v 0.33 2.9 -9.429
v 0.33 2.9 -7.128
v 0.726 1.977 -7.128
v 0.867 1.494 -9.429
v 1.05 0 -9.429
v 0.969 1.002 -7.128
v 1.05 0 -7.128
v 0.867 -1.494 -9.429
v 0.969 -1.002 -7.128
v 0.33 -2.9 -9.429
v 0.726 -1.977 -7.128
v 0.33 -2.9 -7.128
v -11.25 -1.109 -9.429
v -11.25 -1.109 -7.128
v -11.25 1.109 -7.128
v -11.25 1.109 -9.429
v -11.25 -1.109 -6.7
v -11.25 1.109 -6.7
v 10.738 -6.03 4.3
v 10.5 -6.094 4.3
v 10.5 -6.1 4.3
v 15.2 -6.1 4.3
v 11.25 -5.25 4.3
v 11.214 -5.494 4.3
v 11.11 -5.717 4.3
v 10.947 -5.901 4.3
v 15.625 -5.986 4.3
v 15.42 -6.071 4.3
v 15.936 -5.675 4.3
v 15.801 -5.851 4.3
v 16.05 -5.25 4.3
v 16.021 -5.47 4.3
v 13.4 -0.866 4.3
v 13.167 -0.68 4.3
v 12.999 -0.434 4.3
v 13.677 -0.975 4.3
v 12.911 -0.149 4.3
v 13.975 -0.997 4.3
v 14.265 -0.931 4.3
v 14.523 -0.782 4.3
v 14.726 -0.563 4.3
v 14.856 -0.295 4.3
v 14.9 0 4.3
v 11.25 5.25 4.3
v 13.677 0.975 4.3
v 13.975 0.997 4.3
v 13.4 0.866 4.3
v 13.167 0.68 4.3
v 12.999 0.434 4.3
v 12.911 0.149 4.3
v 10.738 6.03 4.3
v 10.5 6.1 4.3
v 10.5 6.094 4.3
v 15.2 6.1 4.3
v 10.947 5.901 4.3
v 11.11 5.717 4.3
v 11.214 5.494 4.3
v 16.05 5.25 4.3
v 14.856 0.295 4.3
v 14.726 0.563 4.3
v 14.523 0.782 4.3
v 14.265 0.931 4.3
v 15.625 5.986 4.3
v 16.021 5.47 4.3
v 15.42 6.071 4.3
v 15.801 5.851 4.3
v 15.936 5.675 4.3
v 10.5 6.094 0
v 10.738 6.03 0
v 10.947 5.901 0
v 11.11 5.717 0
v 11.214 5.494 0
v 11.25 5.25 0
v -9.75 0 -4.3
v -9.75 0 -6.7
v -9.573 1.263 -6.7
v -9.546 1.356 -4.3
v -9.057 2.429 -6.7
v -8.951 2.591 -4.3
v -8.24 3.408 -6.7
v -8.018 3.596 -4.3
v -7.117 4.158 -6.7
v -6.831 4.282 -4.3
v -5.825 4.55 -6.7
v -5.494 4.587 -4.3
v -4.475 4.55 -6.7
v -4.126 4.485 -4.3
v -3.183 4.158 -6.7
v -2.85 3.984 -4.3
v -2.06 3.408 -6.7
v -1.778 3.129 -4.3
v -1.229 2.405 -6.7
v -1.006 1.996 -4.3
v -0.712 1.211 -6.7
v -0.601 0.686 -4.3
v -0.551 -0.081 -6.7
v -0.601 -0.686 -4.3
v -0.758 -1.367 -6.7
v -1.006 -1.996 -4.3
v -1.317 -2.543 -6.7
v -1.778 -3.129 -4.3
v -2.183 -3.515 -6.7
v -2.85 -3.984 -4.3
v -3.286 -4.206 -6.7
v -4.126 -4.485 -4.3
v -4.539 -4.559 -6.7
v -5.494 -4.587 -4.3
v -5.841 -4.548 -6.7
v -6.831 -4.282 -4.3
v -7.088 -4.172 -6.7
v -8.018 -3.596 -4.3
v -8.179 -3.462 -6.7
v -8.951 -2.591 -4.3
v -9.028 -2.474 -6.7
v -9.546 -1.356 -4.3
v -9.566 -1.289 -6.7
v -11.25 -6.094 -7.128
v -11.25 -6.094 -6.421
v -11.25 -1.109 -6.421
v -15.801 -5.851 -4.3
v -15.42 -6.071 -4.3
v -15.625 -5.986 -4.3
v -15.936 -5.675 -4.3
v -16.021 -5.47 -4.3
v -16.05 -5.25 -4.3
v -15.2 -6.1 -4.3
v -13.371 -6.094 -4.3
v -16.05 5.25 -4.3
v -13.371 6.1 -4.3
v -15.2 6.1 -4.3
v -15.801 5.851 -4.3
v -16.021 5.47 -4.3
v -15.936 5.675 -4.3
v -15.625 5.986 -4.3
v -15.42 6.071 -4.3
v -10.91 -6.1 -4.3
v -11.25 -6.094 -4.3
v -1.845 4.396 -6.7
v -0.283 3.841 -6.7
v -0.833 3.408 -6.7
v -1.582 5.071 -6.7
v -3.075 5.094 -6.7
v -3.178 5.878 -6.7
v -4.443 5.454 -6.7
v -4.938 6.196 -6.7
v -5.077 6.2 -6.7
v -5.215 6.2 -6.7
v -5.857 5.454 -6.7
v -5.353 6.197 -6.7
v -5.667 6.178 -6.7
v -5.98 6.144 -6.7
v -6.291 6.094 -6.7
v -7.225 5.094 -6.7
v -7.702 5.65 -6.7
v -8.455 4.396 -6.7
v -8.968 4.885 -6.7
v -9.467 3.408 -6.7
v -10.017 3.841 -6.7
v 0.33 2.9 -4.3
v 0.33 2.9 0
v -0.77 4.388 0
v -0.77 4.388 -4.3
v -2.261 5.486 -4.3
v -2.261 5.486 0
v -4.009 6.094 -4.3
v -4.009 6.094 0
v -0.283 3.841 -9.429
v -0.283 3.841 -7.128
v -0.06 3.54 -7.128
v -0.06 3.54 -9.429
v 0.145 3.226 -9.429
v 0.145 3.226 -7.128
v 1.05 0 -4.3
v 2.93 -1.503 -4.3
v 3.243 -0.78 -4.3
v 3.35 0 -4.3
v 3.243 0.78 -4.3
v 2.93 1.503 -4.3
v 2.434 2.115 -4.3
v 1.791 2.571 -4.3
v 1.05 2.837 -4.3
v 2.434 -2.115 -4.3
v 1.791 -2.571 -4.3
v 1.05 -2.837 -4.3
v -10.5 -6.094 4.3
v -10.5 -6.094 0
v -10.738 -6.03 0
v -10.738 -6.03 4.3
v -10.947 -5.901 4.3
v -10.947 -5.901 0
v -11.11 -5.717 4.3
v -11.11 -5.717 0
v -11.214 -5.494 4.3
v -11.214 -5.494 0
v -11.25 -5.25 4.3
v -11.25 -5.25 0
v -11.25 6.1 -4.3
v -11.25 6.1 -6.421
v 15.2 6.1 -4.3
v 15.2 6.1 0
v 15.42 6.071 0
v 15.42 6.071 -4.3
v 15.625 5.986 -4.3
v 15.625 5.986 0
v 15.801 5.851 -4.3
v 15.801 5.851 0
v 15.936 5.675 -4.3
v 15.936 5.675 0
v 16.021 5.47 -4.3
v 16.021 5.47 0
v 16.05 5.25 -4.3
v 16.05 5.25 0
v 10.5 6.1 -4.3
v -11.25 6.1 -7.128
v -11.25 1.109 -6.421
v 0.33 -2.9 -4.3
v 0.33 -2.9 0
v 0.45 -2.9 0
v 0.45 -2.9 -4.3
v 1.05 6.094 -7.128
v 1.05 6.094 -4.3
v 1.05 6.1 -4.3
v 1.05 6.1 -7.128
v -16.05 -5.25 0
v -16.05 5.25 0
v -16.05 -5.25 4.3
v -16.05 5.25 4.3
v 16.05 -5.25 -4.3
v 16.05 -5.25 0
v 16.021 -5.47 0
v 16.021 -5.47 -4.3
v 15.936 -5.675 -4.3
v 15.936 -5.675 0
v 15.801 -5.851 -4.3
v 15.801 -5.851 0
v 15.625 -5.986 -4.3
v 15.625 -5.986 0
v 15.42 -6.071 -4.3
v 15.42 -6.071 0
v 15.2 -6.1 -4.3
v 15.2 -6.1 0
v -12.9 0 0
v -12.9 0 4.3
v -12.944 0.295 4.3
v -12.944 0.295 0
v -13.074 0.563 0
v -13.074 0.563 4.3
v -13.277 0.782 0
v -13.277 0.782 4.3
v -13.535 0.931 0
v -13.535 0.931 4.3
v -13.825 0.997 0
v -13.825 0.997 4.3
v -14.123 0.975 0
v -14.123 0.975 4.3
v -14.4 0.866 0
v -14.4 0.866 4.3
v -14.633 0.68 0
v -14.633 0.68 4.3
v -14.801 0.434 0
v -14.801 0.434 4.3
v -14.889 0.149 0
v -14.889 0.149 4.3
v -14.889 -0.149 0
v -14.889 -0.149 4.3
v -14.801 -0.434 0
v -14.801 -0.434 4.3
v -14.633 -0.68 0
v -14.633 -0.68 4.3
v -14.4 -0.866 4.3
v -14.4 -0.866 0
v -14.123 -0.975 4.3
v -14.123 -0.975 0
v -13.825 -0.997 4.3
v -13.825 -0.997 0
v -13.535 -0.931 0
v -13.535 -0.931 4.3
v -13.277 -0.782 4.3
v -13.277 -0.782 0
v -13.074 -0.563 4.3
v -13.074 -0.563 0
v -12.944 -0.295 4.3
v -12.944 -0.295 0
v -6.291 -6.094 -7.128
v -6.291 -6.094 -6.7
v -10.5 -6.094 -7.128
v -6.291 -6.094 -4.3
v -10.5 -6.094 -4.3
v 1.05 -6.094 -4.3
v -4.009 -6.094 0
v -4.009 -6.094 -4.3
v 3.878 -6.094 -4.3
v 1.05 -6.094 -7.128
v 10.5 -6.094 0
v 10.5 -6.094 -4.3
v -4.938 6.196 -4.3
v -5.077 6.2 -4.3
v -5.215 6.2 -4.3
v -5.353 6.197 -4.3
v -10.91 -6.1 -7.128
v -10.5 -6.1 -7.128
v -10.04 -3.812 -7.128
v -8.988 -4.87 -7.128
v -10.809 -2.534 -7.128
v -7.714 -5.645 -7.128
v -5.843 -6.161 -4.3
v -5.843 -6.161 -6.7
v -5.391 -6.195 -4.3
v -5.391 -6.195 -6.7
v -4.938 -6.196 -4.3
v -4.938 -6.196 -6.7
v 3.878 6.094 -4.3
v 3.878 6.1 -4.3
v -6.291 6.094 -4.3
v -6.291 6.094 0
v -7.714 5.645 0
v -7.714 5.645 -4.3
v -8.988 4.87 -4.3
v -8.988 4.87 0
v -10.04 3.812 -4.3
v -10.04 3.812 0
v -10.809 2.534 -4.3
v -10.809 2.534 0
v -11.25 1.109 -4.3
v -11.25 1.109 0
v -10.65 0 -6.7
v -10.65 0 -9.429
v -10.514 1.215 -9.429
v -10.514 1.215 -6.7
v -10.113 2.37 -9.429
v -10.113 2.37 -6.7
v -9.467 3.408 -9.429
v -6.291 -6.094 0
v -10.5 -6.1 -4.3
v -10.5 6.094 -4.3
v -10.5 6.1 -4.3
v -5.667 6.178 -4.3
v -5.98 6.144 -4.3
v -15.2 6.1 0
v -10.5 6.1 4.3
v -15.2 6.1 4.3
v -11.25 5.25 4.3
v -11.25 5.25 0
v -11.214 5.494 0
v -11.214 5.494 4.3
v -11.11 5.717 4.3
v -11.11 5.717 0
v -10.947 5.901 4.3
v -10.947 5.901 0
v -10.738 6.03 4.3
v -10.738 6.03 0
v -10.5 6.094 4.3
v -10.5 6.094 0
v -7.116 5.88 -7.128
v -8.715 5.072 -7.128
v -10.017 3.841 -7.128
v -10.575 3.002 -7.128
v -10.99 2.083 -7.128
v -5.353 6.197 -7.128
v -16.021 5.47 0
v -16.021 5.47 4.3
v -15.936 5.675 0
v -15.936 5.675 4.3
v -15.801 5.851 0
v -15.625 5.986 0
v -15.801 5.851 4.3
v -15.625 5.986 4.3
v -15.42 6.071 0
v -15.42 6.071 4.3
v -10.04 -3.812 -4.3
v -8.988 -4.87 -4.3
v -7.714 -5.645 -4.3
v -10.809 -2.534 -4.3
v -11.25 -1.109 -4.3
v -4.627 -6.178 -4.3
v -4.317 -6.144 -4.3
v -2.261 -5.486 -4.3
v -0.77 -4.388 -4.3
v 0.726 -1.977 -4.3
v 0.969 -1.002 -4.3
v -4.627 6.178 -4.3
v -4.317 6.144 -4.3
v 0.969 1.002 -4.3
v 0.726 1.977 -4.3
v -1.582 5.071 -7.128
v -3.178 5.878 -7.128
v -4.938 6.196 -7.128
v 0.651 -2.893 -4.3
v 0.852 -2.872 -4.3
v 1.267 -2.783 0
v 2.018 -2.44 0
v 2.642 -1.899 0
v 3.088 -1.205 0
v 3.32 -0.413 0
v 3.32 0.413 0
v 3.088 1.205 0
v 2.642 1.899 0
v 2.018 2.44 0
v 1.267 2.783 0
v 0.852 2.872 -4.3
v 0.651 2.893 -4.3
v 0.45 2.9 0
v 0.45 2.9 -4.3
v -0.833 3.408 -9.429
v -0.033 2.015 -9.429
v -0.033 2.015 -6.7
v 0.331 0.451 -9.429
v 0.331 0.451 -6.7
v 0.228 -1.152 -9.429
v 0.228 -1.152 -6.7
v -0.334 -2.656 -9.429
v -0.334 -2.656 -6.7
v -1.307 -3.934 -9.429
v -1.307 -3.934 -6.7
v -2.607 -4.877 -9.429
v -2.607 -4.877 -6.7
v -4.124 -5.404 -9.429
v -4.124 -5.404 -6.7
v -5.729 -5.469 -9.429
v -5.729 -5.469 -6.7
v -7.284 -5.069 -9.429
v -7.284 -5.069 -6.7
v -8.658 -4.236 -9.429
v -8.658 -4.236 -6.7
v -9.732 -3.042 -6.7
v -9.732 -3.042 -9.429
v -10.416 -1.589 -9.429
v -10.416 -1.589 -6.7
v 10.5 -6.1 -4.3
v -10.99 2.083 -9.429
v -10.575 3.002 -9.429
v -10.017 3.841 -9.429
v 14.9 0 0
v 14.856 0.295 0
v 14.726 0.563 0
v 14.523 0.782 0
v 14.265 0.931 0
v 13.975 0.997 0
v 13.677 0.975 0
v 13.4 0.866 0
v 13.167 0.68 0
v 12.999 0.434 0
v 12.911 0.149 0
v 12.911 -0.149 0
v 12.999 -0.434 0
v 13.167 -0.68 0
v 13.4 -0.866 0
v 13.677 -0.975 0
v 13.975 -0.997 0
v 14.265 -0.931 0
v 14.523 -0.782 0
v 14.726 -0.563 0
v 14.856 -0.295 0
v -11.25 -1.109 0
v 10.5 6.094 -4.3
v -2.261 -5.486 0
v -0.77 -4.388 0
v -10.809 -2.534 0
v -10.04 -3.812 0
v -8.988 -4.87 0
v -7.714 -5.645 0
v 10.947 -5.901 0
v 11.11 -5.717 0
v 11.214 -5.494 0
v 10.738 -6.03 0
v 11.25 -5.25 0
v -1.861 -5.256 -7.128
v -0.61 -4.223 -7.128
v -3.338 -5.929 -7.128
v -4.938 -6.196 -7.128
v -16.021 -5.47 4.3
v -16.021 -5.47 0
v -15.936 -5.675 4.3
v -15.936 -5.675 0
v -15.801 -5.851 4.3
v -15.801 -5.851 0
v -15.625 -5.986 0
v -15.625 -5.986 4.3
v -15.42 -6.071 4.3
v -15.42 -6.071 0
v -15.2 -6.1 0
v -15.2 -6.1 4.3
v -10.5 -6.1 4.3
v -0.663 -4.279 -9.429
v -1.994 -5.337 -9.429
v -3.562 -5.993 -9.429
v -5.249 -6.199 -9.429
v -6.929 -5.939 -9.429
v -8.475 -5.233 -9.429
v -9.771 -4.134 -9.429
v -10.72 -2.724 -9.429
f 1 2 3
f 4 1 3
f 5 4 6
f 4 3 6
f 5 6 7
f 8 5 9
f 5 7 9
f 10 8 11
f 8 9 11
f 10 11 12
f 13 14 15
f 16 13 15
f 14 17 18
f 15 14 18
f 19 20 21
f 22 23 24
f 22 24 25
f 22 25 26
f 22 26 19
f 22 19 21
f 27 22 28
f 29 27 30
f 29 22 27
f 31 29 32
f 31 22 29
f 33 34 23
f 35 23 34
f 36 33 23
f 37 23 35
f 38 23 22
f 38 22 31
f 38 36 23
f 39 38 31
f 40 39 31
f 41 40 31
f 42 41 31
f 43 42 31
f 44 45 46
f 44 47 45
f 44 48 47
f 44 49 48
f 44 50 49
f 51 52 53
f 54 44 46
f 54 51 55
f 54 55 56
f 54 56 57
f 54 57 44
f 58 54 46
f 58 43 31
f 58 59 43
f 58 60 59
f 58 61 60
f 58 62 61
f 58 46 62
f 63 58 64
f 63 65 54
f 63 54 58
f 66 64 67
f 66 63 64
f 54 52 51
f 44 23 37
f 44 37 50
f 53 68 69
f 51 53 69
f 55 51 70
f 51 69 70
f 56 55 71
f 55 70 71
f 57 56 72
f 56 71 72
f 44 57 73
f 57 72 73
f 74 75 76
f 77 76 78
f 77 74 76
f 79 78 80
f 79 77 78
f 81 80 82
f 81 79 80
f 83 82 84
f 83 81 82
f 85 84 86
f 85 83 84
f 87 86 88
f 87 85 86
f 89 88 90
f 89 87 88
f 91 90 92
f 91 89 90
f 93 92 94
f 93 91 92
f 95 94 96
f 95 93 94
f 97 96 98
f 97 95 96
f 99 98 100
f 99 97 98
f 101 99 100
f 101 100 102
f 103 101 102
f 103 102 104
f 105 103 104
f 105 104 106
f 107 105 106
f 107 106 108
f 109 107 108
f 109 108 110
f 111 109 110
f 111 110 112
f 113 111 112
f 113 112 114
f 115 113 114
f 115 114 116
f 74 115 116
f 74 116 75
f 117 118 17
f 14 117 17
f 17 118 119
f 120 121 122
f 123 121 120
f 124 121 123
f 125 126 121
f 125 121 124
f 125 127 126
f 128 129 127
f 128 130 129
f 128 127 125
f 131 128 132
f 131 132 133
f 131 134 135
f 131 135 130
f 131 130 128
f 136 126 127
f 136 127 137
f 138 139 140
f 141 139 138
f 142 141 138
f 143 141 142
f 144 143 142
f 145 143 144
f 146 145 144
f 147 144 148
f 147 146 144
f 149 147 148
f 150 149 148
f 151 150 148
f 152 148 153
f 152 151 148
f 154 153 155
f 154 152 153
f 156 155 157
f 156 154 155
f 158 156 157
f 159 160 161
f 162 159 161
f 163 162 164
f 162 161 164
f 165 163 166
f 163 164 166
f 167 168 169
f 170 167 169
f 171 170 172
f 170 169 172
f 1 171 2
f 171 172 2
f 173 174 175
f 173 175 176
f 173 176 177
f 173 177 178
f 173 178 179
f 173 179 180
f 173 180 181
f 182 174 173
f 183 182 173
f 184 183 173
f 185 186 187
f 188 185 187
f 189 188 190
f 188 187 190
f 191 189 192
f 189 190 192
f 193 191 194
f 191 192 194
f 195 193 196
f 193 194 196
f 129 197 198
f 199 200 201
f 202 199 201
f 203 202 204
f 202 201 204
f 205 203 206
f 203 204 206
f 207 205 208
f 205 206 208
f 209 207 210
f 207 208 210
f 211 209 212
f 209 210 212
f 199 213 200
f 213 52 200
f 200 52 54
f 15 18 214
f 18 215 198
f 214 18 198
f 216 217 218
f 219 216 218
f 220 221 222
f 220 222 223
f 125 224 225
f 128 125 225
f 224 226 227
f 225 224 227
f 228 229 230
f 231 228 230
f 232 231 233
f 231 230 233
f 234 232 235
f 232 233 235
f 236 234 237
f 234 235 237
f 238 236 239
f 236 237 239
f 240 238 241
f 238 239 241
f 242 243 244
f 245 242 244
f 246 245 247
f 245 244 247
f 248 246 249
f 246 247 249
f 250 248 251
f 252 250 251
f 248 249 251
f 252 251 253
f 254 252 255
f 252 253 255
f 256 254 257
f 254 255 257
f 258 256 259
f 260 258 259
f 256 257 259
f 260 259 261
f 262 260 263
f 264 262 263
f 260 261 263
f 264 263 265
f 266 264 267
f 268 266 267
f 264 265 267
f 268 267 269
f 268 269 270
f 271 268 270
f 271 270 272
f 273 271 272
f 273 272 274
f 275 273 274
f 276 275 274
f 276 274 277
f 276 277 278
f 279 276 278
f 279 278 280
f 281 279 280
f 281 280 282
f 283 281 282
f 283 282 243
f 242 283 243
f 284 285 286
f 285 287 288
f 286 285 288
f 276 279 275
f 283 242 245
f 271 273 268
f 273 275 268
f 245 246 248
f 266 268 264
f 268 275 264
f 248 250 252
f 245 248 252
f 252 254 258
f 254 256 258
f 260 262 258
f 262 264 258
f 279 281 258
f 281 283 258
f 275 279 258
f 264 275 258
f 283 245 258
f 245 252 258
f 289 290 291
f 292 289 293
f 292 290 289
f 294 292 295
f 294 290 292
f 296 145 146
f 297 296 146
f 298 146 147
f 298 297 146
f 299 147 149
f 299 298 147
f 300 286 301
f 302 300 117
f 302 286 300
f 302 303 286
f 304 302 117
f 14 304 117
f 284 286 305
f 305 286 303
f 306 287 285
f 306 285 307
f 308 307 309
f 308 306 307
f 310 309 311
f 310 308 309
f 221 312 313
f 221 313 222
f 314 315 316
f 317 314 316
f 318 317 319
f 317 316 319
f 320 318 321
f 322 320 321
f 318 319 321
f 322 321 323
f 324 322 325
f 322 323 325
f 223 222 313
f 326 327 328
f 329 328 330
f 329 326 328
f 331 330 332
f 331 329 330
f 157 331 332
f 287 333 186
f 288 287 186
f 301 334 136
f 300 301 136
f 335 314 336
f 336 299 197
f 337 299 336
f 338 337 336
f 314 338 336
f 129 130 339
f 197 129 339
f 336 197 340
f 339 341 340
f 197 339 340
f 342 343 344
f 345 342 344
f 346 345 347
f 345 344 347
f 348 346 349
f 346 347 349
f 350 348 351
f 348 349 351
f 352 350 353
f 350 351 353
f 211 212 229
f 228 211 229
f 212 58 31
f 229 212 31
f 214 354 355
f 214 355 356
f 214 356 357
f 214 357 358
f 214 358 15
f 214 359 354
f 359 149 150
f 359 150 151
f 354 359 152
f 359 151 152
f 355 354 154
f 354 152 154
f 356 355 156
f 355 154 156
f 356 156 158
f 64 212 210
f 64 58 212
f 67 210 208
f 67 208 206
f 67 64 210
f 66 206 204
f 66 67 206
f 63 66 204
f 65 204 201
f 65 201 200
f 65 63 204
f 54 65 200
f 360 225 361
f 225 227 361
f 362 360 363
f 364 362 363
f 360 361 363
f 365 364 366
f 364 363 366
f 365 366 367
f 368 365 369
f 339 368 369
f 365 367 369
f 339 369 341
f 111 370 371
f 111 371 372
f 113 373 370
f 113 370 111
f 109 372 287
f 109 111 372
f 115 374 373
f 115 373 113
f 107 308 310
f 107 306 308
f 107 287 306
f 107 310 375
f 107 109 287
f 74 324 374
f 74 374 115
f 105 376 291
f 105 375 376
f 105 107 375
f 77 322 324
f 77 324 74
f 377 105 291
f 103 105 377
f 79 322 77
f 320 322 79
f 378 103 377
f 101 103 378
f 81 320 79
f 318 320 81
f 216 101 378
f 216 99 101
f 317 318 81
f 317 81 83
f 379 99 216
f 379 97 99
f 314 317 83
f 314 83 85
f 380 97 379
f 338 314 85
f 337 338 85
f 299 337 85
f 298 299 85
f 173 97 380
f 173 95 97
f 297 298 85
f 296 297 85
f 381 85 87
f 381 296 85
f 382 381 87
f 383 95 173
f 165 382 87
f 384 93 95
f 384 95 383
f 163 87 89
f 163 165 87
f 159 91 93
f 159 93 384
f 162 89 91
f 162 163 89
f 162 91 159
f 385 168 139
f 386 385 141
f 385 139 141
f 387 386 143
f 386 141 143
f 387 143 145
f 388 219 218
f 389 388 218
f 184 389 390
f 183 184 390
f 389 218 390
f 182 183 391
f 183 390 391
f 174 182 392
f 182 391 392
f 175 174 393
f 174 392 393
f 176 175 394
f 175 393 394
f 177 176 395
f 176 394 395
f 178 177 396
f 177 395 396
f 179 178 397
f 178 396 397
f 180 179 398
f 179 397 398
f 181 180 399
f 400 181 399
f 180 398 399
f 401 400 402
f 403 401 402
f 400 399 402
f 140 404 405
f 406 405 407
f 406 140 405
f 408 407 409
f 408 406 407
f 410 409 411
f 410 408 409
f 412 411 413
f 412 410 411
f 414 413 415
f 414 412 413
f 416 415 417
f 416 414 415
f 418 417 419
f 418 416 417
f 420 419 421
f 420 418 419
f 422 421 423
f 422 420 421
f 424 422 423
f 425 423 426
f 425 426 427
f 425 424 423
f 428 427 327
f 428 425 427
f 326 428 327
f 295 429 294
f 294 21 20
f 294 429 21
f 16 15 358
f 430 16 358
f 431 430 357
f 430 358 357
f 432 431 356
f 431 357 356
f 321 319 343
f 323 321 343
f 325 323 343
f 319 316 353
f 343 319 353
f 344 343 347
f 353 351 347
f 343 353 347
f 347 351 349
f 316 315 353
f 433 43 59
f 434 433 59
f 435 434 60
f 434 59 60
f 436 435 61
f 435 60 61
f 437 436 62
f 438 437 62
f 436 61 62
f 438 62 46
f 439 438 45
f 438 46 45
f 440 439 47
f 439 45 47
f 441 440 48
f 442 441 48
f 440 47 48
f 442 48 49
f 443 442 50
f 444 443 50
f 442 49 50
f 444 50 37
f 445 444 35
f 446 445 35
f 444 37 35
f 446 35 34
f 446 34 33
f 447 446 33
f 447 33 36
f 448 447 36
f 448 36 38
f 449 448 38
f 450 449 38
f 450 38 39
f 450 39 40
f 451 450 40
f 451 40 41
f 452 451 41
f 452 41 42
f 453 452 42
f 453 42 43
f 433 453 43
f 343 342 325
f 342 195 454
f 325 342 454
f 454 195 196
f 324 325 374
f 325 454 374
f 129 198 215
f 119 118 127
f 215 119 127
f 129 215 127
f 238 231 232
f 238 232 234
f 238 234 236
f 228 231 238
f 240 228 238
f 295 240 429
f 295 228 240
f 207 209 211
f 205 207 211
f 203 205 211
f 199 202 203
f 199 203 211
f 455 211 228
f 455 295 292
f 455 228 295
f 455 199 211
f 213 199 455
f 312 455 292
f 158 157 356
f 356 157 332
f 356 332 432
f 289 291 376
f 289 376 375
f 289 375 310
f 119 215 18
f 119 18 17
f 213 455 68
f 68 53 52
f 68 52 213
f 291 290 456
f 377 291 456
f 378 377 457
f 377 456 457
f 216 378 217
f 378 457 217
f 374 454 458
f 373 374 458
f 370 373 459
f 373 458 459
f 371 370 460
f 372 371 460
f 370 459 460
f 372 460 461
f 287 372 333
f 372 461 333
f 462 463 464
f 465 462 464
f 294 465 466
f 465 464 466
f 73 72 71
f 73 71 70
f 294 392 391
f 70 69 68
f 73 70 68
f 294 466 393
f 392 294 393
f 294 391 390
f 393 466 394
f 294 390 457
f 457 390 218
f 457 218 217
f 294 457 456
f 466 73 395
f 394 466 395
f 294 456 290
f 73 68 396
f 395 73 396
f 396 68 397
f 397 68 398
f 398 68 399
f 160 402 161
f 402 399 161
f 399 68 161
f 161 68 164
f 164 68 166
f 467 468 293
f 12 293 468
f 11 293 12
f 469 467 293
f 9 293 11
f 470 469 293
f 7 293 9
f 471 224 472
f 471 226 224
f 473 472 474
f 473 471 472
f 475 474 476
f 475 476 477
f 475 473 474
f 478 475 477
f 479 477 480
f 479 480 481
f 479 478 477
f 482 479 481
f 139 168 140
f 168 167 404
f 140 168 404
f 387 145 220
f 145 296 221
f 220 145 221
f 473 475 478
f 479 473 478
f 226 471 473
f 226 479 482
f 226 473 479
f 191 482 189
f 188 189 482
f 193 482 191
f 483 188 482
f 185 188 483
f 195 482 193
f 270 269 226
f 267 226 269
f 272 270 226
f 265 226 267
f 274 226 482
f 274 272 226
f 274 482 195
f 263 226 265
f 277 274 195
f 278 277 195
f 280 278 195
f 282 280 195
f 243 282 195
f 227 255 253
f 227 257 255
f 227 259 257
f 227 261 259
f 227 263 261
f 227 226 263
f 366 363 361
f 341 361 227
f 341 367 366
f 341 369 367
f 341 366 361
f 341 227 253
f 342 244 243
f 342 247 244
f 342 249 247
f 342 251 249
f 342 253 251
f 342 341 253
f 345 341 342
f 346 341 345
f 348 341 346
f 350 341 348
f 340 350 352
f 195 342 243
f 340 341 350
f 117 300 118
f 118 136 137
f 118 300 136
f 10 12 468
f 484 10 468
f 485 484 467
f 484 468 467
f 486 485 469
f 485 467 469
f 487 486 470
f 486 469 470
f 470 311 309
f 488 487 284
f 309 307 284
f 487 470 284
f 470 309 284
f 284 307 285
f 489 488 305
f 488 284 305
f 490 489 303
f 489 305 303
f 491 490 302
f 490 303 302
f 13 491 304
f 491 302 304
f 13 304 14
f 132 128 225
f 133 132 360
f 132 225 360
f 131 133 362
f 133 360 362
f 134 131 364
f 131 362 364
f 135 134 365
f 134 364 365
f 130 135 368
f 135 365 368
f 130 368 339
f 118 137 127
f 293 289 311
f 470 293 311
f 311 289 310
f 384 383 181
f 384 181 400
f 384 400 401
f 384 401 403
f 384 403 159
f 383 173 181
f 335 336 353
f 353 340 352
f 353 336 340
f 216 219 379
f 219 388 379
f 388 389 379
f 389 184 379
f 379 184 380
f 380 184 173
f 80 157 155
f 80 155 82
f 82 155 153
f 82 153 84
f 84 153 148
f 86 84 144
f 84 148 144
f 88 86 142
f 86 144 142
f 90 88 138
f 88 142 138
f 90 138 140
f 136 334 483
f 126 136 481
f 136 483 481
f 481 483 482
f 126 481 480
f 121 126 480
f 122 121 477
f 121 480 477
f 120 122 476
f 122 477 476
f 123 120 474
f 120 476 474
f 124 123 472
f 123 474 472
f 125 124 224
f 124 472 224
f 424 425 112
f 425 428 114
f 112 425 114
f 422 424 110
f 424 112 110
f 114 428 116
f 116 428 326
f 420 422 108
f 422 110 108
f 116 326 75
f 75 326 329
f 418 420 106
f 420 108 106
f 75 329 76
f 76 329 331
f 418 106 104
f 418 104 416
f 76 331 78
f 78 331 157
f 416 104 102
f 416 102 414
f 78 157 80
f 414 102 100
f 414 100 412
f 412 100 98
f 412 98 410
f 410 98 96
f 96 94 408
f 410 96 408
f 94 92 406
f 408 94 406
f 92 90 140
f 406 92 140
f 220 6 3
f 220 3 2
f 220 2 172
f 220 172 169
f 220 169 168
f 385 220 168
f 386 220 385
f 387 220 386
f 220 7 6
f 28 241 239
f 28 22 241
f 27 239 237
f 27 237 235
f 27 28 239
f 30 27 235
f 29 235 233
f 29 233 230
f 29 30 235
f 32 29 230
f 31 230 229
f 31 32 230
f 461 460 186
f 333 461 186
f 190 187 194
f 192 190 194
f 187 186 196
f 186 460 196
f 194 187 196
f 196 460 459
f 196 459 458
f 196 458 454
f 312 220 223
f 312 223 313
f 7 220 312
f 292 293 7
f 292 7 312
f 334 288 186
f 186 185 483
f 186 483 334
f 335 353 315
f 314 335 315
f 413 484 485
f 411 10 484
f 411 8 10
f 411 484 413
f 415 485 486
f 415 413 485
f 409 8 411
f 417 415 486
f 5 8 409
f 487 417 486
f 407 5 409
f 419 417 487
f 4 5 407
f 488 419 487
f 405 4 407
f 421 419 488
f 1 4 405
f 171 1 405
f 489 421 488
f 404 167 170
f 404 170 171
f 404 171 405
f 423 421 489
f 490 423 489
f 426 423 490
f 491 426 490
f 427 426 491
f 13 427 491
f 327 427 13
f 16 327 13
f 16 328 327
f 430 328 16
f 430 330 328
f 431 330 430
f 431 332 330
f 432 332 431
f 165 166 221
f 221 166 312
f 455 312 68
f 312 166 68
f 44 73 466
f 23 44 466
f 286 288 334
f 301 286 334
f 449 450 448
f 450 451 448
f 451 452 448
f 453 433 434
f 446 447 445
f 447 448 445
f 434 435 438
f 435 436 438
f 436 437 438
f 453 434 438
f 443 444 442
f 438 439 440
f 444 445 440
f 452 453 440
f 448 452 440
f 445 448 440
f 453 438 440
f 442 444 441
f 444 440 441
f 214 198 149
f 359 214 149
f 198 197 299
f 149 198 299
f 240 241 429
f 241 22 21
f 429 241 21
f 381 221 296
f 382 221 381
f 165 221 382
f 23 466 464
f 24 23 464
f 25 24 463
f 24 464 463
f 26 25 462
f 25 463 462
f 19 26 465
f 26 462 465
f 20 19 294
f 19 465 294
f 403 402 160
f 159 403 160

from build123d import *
from build123d.topology import SkipClean

# Parameters (mm, degrees)
SKETCH1_W           = 32.1
SKETCH1_H           = 12.2
BOSS_EXTRUDE1_DEPTH = 4.3
FILLET1_R           = 0.85
CUT_EXTRUDE1_DEPTH  = 10
SKETCH3_R           = 1
CUT_EXTRUDE2_DEPTH  = 5
BOSS_EXTRUDE2_DEPTH = 4.3
SKETCH6_R           = 4.6
BOSS_EXTRUDE3_DEPTH = 2.4
CUT_EXTRUDE4_DEPTH  = 2.4
SKETCH7_R           = 5.5
BOSS_EXTRUDE4_DEPTH = 2.729404
CUT_EXTRUDE3_DEPTH  = 2.729404426
BOSS_EXTRUDE5_DEPTH = 12.194097
BOSS_EXTRUDE6_DEPTH = 2.82843


with BuildPart() as part:
    # Sketch1 → Boss-Extrude1 (new body)
    with BuildSketch(Plane.XY):
        Rectangle(SKETCH1_W, SKETCH1_H)
    extrude(amount=BOSS_EXTRUDE1_DEPTH)

    # Fillet1
    fillet1_edges = [part.edges().sort_by_distance(p)[0] for p in [
        (16.05, -6.1, 2.15),
        (-16.05, -6.1, 2.15),
        (-16.05, 6.1, 2.15),
        (16.05, 6.1, 2.15),
    ]]
    fillet(fillet1_edges, radius=FILLET1_R)

    # Sketch2 → Cut-Extrude1 (cut)
    with BuildSketch(Plane(origin=(0, 0, 0), x_dir=(-1, 0, 0), z_dir=(0, 0, -1))):
        with BuildLine():
            ThreePointArc((-10.4, 6), (-10.930330086, 5.780330086), (-11.15, 5.25))
            Line((-11.15, 5.25), (-11.15, -5.25))
            ThreePointArc((-11.15, -5.25), (-10.930330086, -5.780330086), (-10.4, -6))
            Line((-10.4, -6), (-10.4, -6.1))
            Line((-10.4, -6.1), (10.4, -6.1))
            Line((10.4, -6.1), (10.4, -6))
            ThreePointArc((10.4, -6), (10.930330086, -5.780330086), (11.15, -5.25))
            Line((11.15, -5.25), (11.15, 5.25))
            ThreePointArc((11.15, 5.25), (10.930330086, 5.780330086), (10.4, 6))
            Line((10.4, 6), (10.4, 6.1))
            Line((10.4, 6.1), (-10.4, 6.1))
            Line((-10.4, 6.1), (-10.4, 6))
        make_face()
        with BuildLine():
            Line((-11.15, -5.25), (-11.15, 5.25))
            ThreePointArc((-11.15, 5.25), (-10.930330086, 5.780330086), (-10.4, 6))
            Line((-10.4, 6), (-10.4, 6.1))
            Line((-10.4, 6.1), (-10.5, 6.1))
            Line((-10.5, 6.1), (-10.5, 6.094097151))
            ThreePointArc((-10.5, 6.094097151), (-11.035413251, 5.81457949), (-11.25, 5.25))
            Line((-11.25, 5.25), (-11.25, -5.25))
            ThreePointArc((-11.25, -5.25), (-11.035413251, -5.81457949), (-10.5, -6.094097151))
            Line((-10.5, -6.094097151), (-10.5, -6.1))
            Line((-10.5, -6.1), (-10.4, -6.1))
            Line((-10.4, -6.1), (-10.4, -6))
            ThreePointArc((-10.4, -6), (-10.930330086, -5.780330086), (-11.15, -5.25))
        make_face()
        with BuildLine():
            Line((10.5, 6.1), (10.4, 6.1))
            Line((10.4, 6.1), (10.4, 6))
            ThreePointArc((10.4, 6), (10.930330086, 5.780330086), (11.15, 5.25))
            Line((11.15, 5.25), (11.15, -5.25))
            ThreePointArc((11.15, -5.25), (10.930330086, -5.780330086), (10.4, -6))
            Line((10.4, -6), (10.4, -6.1))
            Line((10.4, -6.1), (10.5, -6.1))
            Line((10.5, -6.1), (10.5, -6.094097151))
            ThreePointArc((10.5, -6.094097151), (11.035413251, -5.81457949), (11.25, -5.25))
            Line((11.25, -5.25), (11.25, 5.25))
            ThreePointArc((11.25, 5.25), (11.035413251, 5.81457949), (10.5, 6.094097151))
            Line((10.5, 6.094097151), (10.5, 6.1))
        make_face()
    extrude(amount=-CUT_EXTRUDE1_DEPTH, mode=Mode.SUBTRACT)


with BuildPart() as cut_extrude1_piece_1:
    # of the separate pieces the step leaves, piece 1, a body of its own (cut_extrude1_pieces)
    add(part.part.solids().sort_by_distance((-15.2, -6.1, 0))[0])


with BuildPart() as cut_extrude1_piece_2:
    # of the separate pieces the step leaves, piece 2, a body of its own (cut_extrude1_pieces)
    add(part.part.solids().sort_by_distance((10.5, -6.1, 0))[0])


with BuildPart() as cut_extrude2_tool:
    # Sketch3 → Cut-Extrude2 (new body)
    with BuildSketch(Plane.XY.offset(4.3)):
        with Locations((-13.9, 0)):
            Circle(SKETCH3_R)
        with Locations((13.9, 0)):
            Circle(SKETCH3_R)
    extrude(amount=-CUT_EXTRUDE2_DEPTH)


with BuildPart() as cut_extrude1_piece_1_1:
    add(cut_extrude1_piece_1.part)

    # Cut-Extrude2: cut by cut_extrude2_tool
    add(cut_extrude2_tool.part, mode=Mode.SUBTRACT)



with BuildPart() as cut_extrude1_piece_2_1:
    add(cut_extrude1_piece_2.part)

    # Cut-Extrude2: cut by cut_extrude2_tool
    add(cut_extrude2_tool.part, mode=Mode.SUBTRACT)


with BuildPart() as cut_extrude1_piece_1_2:
    add(cut_extrude1_piece_1_1.part)

    add(cut_extrude1_piece_2_1.part)  # Boss-Extrude2 merges Cut-Extrude1 piece 2
    # Sketch5 → Boss-Extrude2 (add)
    with BuildSketch(Plane(origin=(0, 0, 0), x_dir=(-1, 0, 0), z_dir=(0, 0, -1))):
        with BuildLine():
            Line((10.5, 6.1), (10.5, 6.094097151))
            Line((10.5, 6.094097151), (6.291043346, 6.094097151))
            ThreePointArc((6.291043346, 6.094097151), (9.545547959, 4.372545957), (11.25, 1.109053651))
            Line((11.25, 1.109053651), (11.25, -1.109053651))
            ThreePointArc((11.25, -1.109053651), (9.545547959, -4.372545957), (6.291043346, -6.094097151))
            Line((6.291043346, -6.094097151), (10.5, -6.094097151))
            Line((10.5, -6.094097151), (10.5, -6.1))
            Line((10.5, -6.1), (15.2, -6.1))
            ThreePointArc((15.2, -6.1), (15.801040764, -5.851040764), (16.05, -5.25))
            Line((16.05, -5.25), (16.05, 5.25))
            ThreePointArc((16.05, 5.25), (15.801040764, 5.851040764), (15.2, 6.1))
            Line((15.2, 6.1), (10.5, 6.1))
        make_face()
        with BuildLine():
            ThreePointArc((-0.329963504, 2.9), (1.474405208, 4.992995386), (4.008956654, 6.094097151))
            Line((4.008956654, 6.094097151), (-10.5, 6.094097151))
            Line((-10.5, 6.094097151), (-10.5, 6.1))
            Line((-10.5, 6.1), (-15.2, 6.1))
            ThreePointArc((-15.2, 6.1), (-15.801040764, 5.851040764), (-16.05, 5.25))
            Line((-16.05, 5.25), (-16.05, -5.25))
            ThreePointArc((-16.05, -5.25), (-15.801040764, -5.851040764), (-15.2, -6.1))
            Line((-15.2, -6.1), (-10.5, -6.1))
            Line((-10.5, -6.1), (-10.5, -6.094097151))
            Line((-10.5, -6.094097151), (4.008956654, -6.094097151))
            ThreePointArc((4.008956654, -6.094097151), (1.474405208, -4.992995386), (-0.329963504, -2.9))
            Line((-0.329963504, -2.9), (-0.45, -2.9))
            ThreePointArc((-0.45, -2.9), (-3.35, 0), (-0.45, 2.9))
            Line((-0.45, 2.9), (-0.329963504, 2.9))
        make_face()
    extrude(amount=BOSS_EXTRUDE2_DEPTH)

    # Sketch12 → Boss-Extrude5 (add)
    with BuildSketch(Plane.XZ.offset(6.094097151)):
        Polygon((1.05, -7.128427125), (3.878427125, -4.3), (1.05, -4.3), align=None)
        Polygon((-11.25, -6.421320344), (-13.371320344, -4.3), (-11.25, -4.3), align=None)
    extrude(amount=-BOSS_EXTRUDE5_DEPTH)



with BuildPart() as body_2:
    # Sketch6 → Boss-Extrude3 (new body)
    with BuildSketch(Plane(origin=(0, 0, -4.3), x_dir=(-1, 0, 0), z_dir=(0, 0, -1))):
        with BuildLine():
            Line((-0.329963504, -2.9), (-0.45, -2.9))
            ThreePointArc((-0.45, -2.9), (-3.35, 0), (-0.45, 2.9))
            Line((-0.45, 2.9), (-0.329963504, 2.9))
            ThreePointArc((-0.329963504, 2.9), (2.45609555, 5.584163215), (6.291043346, 6.094097151))
            ThreePointArc((6.291043346, 6.094097151), (9.545547959, 4.372545957), (11.25, 1.109053651))
            Line((11.25, 1.109053651), (11.25, -1.109053651))
            ThreePointArc((11.25, -1.109053651), (9.545547959, -4.372545957), (6.291043346, -6.094097151))
            ThreePointArc((6.291043346, -6.094097151), (2.45609555, -5.584163215), (-0.329963504, -2.9))
        make_face()
        with Locations((5.15, 0)):
            Circle(SKETCH6_R, mode=Mode.SUBTRACT)
    extrude(amount=BOSS_EXTRUDE3_DEPTH)

    # Sketch11 → Cut-Extrude4 (cut)
    with BuildSketch(Plane(origin=(0, 0, -6.7), x_dir=(-1, 0, 0), z_dir=(0, 0, -1))):
        with BuildLine():
            ThreePointArc((-0.329963504, -2.9), (-1.05, 0), (-0.329963504, 2.9))
            Line((-0.329963504, 2.9), (-0.45, 2.9))
            ThreePointArc((-0.45, 2.9), (-3.35, 0), (-0.45, -2.9))
            Line((-0.45, -2.9), (-0.329963504, -2.9))
        make_face()
        with BuildLine():
            ThreePointArc((-0.329963504, 2.9), (-0.172147578, 3.180368714), (0, 3.452173229))
            Line((0, 3.452173229), (-4.085462696, 3.186724013))
            Line((-4.085462696, 3.186724013), (-4.085462696, -3.40285267))
            Line((-4.085462696, -3.40285267), (0, -3.452173229))
            ThreePointArc((0, -3.452173229), (-0.172147578, -3.180368714), (-0.329963504, -2.9))
            Line((-0.329963504, -2.9), (-0.45, -2.9))
            ThreePointArc((-0.45, -2.9), (-3.35, 0), (-0.45, 2.9))
            Line((-0.45, 2.9), (-0.329963504, 2.9))
        make_face()
    extrude(amount=-CUT_EXTRUDE4_DEPTH, mode=Mode.SUBTRACT)

    # Sketch7 → Boss-Extrude4 (add)
    with SkipClean():  # the faces are left unmerged after this step: merging them gives an invalid solid
        with BuildSketch(Plane(origin=(0, 0, -6.7), x_dir=(-1, 0, 0), z_dir=(0, 0, -1))):
            with BuildLine():
                Line((11.25, -1.109053651), (11.25, 1.109053651))
                ThreePointArc((11.25, 1.109053651), (6.097619924, 6.127154028), (-0.329963504, 2.9))
                ThreePointArc((-0.329963504, 2.9), (-1.05, 0), (-0.329963504, -2.9))
                ThreePointArc((-0.329963504, -2.9), (6.097619924, -6.127154028), (11.25, -1.109053651))
            make_face()
            with Locations((5.15, 0)):
                Circle(SKETCH7_R, mode=Mode.SUBTRACT)
        extrude(amount=BOSS_EXTRUDE4_DEPTH)

    # Sketch8 → Cut-Extrude3 (cut)
    with SkipClean():  # the faces are left unmerged after this step: merging them gives an invalid solid
        with BuildSketch(Plane(origin=(0, 0, -9.429404426), x_dir=(-1, 0, 0), z_dir=(0, 0, -1))):
            Polygon((9.467113453, 3.407716454), (10.016564256, 3.841425821), (10.016564256, 6.311111289), (0.283435744, 6.311111289), (0.283435744, 3.841425821), (0.832886547, 3.407716454), align=None)
        extrude(amount=-CUT_EXTRUDE3_DEPTH, mode=Mode.SUBTRACT)


with BuildPart() as cut_extrude1_piece_1_3:
    with SkipClean():  # the faces are left unmerged after this step: merging them gives an invalid solid
        add(cut_extrude1_piece_1_2.part)

        add(body_2.part)  # Boss-Extrude6 merges body 2
        # Sketch13 → Boss-Extrude6 (add)
        with BuildSketch(Plane(origin=(0, 0, -4.3), x_dir=(-1, 0, 0), z_dir=(0, 0, -1))):
            with BuildLine():
                Line((4.938256081, 6.19638318), (-1.05, 6.094097151))
                Line((-1.05, 6.094097151), (-1.05, 0))
                ThreePointArc((-1.05, 0), (0.691703672, 4.308548926), (4.938256081, 6.19638318))
            make_face()
            with BuildLine():
                Line((11.25, 6.1), (5.353224073, 6.196668458))
                ThreePointArc((5.353224073, 6.196668458), (9.200137595, 4.694292861), (11.25, 1.109053651))
                Line((11.25, 1.109053651), (11.25, 6.1))
            make_face()
            with BuildLine():
                Line((11.25, -6.094097151), (11.25, -1.109053651))
                ThreePointArc((11.25, -1.109053651), (9.545547959, -4.372545957), (6.291043346, -6.094097151))
                Line((6.291043346, -6.094097151), (10.5, -6.094097151))
                Line((10.5, -6.094097151), (10.5, -6.1))
                Line((10.5, -6.1), (10.909996116, -6.1))
                Line((10.909996116, -6.1), (11.25, -6.094097151))
            make_face()
            with BuildLine():
                ThreePointArc((4.938256081, -6.19638318), (0.691703672, -4.308548926), (-1.05, 0))
                Line((-1.05, 0), (-1.05, -6.094097151))
                Line((-1.05, -6.094097151), (4.938256081, -6.19638318))
            make_face()
        extrude(amount=BOSS_EXTRUDE6_DEPTH)


solid = cut_extrude1_piece_1_3.part
